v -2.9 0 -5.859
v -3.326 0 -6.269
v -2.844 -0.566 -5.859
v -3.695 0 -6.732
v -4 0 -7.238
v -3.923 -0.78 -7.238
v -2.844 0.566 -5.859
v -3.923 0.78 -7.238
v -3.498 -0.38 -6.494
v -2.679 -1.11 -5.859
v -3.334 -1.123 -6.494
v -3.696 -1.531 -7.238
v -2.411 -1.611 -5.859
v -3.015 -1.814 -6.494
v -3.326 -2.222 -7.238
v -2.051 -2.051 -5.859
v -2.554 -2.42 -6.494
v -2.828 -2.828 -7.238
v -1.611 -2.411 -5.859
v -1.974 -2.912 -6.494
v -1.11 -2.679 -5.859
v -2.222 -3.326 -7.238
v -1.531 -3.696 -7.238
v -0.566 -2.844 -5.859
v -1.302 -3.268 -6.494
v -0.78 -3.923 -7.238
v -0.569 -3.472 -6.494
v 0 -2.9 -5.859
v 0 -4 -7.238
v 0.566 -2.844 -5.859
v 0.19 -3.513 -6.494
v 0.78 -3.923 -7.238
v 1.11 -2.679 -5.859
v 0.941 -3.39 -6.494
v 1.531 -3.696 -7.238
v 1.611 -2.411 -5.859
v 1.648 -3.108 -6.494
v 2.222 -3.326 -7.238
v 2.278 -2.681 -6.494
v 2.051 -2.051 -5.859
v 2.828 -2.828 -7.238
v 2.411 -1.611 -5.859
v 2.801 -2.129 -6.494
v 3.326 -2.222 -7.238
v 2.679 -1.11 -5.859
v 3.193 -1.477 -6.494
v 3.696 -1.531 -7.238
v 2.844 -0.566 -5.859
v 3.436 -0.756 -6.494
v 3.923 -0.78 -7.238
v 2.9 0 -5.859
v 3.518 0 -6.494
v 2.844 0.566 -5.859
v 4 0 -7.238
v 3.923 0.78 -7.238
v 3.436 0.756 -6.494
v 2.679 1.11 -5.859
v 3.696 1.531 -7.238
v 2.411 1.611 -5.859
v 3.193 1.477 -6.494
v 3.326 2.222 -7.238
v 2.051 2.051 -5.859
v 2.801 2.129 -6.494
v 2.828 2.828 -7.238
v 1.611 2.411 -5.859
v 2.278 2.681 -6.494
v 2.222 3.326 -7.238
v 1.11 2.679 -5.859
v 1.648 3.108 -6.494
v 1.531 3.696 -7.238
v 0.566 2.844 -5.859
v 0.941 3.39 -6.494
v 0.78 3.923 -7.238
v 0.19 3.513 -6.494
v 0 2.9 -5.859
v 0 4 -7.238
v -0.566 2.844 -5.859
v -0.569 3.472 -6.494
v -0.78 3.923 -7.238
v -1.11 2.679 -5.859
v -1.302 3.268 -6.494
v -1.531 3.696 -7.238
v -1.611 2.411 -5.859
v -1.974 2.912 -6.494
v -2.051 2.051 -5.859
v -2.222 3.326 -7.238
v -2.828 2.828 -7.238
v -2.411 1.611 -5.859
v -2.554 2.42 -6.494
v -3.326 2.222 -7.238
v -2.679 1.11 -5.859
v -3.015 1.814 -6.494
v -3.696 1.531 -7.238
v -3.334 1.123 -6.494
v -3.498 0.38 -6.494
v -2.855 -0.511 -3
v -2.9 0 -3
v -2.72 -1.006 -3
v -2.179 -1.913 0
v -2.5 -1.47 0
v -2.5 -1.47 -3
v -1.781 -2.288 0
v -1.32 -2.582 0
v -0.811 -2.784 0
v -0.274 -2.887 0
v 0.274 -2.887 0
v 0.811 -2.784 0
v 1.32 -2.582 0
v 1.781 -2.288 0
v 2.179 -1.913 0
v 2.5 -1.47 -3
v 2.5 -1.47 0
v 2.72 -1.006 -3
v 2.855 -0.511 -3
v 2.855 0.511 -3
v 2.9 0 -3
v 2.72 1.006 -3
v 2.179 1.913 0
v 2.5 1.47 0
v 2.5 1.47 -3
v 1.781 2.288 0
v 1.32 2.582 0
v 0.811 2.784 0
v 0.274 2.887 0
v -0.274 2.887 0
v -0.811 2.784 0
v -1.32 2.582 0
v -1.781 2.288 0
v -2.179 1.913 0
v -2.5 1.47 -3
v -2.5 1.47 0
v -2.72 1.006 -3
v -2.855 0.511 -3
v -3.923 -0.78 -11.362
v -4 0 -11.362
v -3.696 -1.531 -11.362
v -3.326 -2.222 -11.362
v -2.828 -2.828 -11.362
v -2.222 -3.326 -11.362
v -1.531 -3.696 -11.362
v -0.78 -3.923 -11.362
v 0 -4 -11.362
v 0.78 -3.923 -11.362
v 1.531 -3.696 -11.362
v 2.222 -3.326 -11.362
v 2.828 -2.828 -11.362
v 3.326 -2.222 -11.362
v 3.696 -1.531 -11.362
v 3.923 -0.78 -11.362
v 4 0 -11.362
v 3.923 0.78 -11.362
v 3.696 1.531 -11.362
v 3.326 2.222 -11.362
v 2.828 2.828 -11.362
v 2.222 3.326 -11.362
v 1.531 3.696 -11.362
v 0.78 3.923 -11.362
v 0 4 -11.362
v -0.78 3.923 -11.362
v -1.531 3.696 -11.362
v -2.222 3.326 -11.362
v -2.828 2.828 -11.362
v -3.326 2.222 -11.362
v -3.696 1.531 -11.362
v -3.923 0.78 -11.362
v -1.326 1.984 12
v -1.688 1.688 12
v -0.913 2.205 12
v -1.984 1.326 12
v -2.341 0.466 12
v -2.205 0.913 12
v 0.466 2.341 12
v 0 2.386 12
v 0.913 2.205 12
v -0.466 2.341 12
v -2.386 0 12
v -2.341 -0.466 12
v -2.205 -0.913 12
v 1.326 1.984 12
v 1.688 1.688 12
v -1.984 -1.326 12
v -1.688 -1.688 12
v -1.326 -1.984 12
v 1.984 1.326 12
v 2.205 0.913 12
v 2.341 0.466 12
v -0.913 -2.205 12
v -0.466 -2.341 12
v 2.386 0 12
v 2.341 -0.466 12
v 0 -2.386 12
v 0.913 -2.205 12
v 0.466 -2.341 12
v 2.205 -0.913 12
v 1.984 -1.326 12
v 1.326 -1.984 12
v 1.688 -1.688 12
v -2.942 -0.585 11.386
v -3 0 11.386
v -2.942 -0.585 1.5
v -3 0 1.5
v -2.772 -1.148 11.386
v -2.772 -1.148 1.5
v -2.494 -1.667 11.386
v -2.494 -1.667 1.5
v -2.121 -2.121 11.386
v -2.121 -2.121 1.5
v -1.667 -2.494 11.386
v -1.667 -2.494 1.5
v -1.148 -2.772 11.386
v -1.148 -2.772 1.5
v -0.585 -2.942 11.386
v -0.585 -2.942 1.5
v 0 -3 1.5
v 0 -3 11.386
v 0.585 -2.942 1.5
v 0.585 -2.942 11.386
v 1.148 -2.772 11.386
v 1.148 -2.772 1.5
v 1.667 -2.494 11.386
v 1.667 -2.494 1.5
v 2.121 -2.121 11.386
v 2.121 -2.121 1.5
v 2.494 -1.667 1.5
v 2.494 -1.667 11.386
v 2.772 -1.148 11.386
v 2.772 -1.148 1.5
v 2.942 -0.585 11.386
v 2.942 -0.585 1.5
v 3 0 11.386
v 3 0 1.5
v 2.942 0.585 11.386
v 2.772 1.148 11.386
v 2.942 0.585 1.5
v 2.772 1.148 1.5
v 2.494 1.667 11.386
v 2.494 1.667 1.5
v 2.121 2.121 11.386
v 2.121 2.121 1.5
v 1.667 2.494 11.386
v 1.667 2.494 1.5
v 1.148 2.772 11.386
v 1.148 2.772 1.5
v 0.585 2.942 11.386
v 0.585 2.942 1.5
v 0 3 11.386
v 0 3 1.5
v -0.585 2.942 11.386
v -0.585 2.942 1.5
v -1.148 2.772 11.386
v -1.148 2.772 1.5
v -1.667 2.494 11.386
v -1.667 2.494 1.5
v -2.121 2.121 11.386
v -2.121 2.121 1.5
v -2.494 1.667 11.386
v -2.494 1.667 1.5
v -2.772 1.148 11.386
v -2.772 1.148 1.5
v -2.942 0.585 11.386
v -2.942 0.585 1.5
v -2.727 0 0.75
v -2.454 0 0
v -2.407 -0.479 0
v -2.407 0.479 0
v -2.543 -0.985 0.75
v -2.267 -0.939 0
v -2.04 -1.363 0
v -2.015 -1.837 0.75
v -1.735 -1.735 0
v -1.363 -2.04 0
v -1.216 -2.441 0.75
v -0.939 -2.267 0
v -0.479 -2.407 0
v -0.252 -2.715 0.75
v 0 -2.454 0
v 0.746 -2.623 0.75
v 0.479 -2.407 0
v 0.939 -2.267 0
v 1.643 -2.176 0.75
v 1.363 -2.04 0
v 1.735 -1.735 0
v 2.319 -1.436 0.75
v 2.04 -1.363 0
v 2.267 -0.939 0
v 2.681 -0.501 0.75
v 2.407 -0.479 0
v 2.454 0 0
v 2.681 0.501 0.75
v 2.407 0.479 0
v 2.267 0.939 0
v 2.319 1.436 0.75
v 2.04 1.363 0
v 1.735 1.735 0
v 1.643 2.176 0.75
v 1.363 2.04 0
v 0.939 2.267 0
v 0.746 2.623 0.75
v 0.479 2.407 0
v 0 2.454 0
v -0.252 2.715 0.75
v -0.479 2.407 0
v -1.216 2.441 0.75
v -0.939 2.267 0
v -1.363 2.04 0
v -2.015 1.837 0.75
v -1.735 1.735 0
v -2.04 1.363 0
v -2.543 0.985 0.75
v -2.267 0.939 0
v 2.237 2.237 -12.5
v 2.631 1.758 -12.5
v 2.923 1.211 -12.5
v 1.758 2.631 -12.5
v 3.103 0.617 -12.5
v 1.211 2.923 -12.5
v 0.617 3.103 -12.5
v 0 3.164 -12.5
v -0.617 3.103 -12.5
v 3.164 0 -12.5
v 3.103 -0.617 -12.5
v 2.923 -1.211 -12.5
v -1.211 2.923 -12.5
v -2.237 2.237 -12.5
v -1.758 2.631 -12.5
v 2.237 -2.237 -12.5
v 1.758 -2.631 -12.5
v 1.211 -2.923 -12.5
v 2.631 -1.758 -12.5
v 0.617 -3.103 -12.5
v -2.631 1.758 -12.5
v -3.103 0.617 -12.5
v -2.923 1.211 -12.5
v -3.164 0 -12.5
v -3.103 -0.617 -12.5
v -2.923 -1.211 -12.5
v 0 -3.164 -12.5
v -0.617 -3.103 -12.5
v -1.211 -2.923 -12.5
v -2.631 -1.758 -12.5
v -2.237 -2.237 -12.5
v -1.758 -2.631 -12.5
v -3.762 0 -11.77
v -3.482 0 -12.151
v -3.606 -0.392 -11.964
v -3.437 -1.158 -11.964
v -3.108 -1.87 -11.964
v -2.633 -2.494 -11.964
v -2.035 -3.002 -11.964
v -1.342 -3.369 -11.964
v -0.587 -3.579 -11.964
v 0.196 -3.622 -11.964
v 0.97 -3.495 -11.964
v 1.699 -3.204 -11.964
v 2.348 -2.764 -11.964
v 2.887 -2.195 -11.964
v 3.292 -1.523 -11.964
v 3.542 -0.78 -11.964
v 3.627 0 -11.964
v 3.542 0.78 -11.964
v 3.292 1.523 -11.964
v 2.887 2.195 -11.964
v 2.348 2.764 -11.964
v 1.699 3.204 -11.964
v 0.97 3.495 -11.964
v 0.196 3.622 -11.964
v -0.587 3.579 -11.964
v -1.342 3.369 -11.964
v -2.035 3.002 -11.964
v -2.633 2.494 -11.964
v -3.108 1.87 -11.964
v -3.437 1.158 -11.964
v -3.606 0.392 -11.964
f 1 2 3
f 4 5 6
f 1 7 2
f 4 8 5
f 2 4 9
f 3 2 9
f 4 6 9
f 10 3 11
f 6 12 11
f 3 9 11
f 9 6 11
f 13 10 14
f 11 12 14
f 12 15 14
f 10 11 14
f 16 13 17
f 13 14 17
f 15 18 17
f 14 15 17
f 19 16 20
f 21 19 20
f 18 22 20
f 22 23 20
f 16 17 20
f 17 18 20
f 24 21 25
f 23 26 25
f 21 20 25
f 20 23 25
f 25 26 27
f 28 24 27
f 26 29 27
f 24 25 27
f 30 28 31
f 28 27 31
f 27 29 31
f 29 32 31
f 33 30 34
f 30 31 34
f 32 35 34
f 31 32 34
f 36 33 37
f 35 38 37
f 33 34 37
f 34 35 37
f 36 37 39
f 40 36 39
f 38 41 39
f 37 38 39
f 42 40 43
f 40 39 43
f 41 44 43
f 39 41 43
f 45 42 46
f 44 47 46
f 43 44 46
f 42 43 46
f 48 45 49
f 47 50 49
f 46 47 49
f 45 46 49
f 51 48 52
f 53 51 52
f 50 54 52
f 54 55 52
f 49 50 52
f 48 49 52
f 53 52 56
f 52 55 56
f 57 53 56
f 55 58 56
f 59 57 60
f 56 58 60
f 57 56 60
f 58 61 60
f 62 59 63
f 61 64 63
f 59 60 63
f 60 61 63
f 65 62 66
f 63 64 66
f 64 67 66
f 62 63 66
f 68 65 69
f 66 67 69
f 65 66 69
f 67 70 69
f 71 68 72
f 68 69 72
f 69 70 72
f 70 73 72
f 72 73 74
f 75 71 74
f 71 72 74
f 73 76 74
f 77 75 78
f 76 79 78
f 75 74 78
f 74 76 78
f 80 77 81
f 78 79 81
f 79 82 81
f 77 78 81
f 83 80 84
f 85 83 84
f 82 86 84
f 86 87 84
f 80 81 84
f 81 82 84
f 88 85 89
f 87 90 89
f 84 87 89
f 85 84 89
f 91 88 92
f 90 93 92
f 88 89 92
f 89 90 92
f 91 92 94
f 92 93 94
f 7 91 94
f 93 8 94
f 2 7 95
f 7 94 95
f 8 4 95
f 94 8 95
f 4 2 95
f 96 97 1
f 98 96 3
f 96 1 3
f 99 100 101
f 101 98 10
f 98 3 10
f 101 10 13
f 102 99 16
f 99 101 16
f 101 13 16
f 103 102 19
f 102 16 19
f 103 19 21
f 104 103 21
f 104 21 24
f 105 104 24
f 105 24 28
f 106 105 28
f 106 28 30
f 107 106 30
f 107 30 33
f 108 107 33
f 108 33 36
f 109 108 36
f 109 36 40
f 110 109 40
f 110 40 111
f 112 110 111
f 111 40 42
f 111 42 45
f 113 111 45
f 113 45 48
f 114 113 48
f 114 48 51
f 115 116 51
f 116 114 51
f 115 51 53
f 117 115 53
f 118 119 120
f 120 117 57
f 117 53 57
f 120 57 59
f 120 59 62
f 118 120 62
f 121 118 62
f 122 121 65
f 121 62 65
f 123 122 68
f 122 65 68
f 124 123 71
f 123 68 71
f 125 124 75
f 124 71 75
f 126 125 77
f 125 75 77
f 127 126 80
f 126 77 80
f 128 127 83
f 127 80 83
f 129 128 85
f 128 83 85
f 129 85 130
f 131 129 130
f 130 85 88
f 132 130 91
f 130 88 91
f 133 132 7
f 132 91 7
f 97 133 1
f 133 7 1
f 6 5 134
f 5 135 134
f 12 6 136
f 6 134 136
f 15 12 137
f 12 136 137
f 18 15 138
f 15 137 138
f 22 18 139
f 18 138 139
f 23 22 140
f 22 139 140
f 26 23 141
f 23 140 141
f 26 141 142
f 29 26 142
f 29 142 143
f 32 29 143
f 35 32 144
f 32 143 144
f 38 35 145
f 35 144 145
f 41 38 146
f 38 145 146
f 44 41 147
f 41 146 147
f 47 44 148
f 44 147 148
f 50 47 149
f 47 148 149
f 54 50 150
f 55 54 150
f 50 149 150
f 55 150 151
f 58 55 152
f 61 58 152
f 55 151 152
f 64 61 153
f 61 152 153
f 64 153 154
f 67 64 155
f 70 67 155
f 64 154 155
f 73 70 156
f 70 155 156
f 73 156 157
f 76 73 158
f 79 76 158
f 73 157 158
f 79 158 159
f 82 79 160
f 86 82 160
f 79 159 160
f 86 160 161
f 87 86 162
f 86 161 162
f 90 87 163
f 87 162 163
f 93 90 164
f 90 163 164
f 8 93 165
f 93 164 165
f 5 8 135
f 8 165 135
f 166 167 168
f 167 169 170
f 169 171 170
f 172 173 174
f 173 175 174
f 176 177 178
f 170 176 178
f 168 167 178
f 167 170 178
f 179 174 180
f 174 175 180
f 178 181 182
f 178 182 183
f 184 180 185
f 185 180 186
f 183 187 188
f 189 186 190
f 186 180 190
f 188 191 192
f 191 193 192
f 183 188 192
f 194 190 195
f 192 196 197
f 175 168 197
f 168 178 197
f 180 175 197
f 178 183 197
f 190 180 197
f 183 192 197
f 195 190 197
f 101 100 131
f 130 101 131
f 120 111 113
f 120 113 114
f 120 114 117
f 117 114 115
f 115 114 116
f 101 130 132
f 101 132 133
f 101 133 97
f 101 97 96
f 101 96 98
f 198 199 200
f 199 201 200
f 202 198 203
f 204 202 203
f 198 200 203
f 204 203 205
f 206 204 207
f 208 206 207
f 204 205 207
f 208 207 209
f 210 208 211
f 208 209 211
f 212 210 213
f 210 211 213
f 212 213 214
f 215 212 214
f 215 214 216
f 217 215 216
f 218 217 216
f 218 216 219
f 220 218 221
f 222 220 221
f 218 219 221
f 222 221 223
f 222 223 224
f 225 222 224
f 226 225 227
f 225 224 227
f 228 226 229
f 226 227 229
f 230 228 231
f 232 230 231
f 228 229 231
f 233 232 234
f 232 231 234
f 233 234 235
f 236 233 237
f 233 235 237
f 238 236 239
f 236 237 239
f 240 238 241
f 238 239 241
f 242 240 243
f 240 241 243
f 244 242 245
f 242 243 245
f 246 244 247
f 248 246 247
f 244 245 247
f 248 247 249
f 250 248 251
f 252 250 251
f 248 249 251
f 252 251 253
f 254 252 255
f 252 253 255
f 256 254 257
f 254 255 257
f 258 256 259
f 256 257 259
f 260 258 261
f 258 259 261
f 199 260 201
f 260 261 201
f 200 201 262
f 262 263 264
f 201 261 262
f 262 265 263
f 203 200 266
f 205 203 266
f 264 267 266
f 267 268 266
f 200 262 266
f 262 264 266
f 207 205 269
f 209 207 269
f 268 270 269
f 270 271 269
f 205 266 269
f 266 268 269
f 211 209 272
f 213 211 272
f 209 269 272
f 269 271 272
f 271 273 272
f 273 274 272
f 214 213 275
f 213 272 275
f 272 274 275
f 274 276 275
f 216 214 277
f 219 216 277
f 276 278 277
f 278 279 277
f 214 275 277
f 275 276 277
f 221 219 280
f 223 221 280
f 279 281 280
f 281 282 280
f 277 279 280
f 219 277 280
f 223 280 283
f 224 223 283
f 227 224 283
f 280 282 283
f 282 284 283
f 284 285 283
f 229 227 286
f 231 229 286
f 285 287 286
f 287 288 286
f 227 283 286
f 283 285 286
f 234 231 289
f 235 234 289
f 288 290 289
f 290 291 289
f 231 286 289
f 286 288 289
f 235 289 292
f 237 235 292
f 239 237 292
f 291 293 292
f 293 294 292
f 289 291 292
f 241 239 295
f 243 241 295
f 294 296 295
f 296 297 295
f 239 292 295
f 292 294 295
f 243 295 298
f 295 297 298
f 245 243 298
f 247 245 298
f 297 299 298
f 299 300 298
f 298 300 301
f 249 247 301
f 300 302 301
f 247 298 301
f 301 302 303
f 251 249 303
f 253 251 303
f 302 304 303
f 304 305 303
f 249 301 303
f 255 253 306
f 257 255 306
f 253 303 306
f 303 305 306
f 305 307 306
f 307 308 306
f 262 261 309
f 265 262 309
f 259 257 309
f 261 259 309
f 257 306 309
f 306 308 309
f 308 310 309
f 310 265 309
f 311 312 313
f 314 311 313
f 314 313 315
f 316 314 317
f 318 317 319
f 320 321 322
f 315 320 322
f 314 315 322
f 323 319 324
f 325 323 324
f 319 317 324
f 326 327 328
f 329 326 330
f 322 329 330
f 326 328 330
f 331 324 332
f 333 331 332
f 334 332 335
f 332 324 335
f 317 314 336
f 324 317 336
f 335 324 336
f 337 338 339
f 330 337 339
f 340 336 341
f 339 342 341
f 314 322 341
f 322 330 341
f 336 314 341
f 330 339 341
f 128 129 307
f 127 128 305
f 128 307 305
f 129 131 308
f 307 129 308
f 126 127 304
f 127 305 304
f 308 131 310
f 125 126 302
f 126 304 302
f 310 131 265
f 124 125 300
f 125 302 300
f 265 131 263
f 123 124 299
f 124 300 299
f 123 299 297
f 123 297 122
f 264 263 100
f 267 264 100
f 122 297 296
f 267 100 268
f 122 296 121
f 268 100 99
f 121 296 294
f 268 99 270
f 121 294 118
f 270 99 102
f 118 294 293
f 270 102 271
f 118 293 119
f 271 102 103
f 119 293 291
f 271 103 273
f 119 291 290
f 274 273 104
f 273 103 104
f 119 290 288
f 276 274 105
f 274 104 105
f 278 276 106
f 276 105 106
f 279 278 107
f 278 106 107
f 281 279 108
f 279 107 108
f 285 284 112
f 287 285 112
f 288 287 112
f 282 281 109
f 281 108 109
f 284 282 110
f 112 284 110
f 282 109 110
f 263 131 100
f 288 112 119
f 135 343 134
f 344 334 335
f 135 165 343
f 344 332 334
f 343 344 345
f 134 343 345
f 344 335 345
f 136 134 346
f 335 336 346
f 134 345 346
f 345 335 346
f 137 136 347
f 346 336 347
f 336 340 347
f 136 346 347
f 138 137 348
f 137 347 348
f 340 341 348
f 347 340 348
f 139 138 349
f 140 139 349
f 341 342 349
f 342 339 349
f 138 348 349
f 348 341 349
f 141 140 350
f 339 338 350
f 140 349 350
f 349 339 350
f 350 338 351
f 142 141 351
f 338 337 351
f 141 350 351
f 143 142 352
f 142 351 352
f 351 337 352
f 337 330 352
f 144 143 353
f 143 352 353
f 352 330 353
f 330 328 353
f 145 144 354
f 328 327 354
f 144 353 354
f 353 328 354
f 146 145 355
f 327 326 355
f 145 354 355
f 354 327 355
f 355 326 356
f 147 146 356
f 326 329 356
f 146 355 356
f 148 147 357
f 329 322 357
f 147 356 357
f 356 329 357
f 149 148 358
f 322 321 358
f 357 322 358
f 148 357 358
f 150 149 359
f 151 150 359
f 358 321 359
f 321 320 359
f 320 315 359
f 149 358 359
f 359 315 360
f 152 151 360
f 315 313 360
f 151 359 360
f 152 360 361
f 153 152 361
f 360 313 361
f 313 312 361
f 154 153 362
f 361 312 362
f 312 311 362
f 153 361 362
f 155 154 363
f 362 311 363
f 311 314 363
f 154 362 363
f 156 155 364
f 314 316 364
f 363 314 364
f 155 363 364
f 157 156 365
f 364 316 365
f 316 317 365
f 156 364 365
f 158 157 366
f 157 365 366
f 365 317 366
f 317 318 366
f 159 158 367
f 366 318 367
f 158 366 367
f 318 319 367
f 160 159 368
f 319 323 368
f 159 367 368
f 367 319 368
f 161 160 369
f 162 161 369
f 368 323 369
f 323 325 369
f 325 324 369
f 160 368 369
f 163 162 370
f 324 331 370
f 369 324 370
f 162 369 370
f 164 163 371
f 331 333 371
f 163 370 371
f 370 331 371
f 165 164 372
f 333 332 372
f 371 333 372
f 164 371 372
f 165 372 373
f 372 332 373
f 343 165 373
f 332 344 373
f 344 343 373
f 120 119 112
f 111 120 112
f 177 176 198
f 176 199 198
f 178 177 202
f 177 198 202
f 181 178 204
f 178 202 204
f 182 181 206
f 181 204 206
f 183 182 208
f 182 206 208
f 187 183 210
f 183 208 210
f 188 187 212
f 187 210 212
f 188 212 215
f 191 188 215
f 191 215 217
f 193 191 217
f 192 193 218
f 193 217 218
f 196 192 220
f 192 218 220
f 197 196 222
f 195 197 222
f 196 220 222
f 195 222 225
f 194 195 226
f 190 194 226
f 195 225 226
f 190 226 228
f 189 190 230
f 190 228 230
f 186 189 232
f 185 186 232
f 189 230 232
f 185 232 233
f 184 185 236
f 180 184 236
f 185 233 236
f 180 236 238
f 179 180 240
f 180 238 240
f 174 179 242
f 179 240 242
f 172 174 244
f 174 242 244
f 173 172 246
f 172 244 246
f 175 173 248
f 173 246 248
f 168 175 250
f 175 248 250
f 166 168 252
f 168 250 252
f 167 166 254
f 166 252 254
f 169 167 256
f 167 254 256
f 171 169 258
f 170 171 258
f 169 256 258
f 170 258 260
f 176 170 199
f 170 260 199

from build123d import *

# Parameters (mm, degrees)
SCHNITT_LINEAR_AUSTRAGEN1_DEPTH      = 3
SCHNITT_LINEAR_AUSTRAGEN1_DEPTH_BACK = 3


with BuildPart() as part:
    # Skizze1 → Rotation1 (revolve)
    with BuildSketch(Plane(origin=(0, 0, 0), x_dir=(1, 0, 0), z_dir=(0, 1, 0))):
        with BuildLine():
            Line((0, 0), (-2.9, 0))
            Line((-2.9, 0), (-2.9, 5.859069893))
            ThreePointArc((-2.9, 5.859069893), (-3.518262416, 6.494321905), (-4, 7.238447187))
            Line((-4, 7.238447187), (-4, 11.361552813))
            ThreePointArc((-4, 11.361552813), (-3.626876384, 11.963788222), (-3.163858404, 12.5))
            Line((-3.163858404, 12.5), (0, 12.5))
            Line((0, 12.5), (0, 0))
        make_face()
    revolve(axis=Axis((0, 0, -12.5), (0, 0, 1)))

    # Skizze2 → Schnitt-Linear austragen1 (cut, two sides: drawn at the far end of the back side and taken through both)
    with BuildSketch(Plane.XY.offset(-SCHNITT_LINEAR_AUSTRAGEN1_DEPTH_BACK)):
        Polygon((6, 4), (2.5, 4), (2.5, -5), (-2.5, -5), (-2.5, 4), (-6, 4), (-6, -6), (6, -6), align=None)
    extrude(amount=SCHNITT_LINEAR_AUSTRAGEN1_DEPTH + SCHNITT_LINEAR_AUSTRAGEN1_DEPTH_BACK, mode=Mode.SUBTRACT)

    # Skizze3 → Rotation2 (revolve)
    with BuildSketch(Plane(origin=(0, 0, 0), x_dir=(1, 0, 0), z_dir=(0, 1, 0))):
        Polygon((0, -12), (-2.3865, -12), (-3, -11.3865), (-3, -1.5), (-2.454044649, 0), (0, 0), align=None)
    revolve(axis=Axis((0, 0, 0), (0, 0, 1)))


solid = part.part
